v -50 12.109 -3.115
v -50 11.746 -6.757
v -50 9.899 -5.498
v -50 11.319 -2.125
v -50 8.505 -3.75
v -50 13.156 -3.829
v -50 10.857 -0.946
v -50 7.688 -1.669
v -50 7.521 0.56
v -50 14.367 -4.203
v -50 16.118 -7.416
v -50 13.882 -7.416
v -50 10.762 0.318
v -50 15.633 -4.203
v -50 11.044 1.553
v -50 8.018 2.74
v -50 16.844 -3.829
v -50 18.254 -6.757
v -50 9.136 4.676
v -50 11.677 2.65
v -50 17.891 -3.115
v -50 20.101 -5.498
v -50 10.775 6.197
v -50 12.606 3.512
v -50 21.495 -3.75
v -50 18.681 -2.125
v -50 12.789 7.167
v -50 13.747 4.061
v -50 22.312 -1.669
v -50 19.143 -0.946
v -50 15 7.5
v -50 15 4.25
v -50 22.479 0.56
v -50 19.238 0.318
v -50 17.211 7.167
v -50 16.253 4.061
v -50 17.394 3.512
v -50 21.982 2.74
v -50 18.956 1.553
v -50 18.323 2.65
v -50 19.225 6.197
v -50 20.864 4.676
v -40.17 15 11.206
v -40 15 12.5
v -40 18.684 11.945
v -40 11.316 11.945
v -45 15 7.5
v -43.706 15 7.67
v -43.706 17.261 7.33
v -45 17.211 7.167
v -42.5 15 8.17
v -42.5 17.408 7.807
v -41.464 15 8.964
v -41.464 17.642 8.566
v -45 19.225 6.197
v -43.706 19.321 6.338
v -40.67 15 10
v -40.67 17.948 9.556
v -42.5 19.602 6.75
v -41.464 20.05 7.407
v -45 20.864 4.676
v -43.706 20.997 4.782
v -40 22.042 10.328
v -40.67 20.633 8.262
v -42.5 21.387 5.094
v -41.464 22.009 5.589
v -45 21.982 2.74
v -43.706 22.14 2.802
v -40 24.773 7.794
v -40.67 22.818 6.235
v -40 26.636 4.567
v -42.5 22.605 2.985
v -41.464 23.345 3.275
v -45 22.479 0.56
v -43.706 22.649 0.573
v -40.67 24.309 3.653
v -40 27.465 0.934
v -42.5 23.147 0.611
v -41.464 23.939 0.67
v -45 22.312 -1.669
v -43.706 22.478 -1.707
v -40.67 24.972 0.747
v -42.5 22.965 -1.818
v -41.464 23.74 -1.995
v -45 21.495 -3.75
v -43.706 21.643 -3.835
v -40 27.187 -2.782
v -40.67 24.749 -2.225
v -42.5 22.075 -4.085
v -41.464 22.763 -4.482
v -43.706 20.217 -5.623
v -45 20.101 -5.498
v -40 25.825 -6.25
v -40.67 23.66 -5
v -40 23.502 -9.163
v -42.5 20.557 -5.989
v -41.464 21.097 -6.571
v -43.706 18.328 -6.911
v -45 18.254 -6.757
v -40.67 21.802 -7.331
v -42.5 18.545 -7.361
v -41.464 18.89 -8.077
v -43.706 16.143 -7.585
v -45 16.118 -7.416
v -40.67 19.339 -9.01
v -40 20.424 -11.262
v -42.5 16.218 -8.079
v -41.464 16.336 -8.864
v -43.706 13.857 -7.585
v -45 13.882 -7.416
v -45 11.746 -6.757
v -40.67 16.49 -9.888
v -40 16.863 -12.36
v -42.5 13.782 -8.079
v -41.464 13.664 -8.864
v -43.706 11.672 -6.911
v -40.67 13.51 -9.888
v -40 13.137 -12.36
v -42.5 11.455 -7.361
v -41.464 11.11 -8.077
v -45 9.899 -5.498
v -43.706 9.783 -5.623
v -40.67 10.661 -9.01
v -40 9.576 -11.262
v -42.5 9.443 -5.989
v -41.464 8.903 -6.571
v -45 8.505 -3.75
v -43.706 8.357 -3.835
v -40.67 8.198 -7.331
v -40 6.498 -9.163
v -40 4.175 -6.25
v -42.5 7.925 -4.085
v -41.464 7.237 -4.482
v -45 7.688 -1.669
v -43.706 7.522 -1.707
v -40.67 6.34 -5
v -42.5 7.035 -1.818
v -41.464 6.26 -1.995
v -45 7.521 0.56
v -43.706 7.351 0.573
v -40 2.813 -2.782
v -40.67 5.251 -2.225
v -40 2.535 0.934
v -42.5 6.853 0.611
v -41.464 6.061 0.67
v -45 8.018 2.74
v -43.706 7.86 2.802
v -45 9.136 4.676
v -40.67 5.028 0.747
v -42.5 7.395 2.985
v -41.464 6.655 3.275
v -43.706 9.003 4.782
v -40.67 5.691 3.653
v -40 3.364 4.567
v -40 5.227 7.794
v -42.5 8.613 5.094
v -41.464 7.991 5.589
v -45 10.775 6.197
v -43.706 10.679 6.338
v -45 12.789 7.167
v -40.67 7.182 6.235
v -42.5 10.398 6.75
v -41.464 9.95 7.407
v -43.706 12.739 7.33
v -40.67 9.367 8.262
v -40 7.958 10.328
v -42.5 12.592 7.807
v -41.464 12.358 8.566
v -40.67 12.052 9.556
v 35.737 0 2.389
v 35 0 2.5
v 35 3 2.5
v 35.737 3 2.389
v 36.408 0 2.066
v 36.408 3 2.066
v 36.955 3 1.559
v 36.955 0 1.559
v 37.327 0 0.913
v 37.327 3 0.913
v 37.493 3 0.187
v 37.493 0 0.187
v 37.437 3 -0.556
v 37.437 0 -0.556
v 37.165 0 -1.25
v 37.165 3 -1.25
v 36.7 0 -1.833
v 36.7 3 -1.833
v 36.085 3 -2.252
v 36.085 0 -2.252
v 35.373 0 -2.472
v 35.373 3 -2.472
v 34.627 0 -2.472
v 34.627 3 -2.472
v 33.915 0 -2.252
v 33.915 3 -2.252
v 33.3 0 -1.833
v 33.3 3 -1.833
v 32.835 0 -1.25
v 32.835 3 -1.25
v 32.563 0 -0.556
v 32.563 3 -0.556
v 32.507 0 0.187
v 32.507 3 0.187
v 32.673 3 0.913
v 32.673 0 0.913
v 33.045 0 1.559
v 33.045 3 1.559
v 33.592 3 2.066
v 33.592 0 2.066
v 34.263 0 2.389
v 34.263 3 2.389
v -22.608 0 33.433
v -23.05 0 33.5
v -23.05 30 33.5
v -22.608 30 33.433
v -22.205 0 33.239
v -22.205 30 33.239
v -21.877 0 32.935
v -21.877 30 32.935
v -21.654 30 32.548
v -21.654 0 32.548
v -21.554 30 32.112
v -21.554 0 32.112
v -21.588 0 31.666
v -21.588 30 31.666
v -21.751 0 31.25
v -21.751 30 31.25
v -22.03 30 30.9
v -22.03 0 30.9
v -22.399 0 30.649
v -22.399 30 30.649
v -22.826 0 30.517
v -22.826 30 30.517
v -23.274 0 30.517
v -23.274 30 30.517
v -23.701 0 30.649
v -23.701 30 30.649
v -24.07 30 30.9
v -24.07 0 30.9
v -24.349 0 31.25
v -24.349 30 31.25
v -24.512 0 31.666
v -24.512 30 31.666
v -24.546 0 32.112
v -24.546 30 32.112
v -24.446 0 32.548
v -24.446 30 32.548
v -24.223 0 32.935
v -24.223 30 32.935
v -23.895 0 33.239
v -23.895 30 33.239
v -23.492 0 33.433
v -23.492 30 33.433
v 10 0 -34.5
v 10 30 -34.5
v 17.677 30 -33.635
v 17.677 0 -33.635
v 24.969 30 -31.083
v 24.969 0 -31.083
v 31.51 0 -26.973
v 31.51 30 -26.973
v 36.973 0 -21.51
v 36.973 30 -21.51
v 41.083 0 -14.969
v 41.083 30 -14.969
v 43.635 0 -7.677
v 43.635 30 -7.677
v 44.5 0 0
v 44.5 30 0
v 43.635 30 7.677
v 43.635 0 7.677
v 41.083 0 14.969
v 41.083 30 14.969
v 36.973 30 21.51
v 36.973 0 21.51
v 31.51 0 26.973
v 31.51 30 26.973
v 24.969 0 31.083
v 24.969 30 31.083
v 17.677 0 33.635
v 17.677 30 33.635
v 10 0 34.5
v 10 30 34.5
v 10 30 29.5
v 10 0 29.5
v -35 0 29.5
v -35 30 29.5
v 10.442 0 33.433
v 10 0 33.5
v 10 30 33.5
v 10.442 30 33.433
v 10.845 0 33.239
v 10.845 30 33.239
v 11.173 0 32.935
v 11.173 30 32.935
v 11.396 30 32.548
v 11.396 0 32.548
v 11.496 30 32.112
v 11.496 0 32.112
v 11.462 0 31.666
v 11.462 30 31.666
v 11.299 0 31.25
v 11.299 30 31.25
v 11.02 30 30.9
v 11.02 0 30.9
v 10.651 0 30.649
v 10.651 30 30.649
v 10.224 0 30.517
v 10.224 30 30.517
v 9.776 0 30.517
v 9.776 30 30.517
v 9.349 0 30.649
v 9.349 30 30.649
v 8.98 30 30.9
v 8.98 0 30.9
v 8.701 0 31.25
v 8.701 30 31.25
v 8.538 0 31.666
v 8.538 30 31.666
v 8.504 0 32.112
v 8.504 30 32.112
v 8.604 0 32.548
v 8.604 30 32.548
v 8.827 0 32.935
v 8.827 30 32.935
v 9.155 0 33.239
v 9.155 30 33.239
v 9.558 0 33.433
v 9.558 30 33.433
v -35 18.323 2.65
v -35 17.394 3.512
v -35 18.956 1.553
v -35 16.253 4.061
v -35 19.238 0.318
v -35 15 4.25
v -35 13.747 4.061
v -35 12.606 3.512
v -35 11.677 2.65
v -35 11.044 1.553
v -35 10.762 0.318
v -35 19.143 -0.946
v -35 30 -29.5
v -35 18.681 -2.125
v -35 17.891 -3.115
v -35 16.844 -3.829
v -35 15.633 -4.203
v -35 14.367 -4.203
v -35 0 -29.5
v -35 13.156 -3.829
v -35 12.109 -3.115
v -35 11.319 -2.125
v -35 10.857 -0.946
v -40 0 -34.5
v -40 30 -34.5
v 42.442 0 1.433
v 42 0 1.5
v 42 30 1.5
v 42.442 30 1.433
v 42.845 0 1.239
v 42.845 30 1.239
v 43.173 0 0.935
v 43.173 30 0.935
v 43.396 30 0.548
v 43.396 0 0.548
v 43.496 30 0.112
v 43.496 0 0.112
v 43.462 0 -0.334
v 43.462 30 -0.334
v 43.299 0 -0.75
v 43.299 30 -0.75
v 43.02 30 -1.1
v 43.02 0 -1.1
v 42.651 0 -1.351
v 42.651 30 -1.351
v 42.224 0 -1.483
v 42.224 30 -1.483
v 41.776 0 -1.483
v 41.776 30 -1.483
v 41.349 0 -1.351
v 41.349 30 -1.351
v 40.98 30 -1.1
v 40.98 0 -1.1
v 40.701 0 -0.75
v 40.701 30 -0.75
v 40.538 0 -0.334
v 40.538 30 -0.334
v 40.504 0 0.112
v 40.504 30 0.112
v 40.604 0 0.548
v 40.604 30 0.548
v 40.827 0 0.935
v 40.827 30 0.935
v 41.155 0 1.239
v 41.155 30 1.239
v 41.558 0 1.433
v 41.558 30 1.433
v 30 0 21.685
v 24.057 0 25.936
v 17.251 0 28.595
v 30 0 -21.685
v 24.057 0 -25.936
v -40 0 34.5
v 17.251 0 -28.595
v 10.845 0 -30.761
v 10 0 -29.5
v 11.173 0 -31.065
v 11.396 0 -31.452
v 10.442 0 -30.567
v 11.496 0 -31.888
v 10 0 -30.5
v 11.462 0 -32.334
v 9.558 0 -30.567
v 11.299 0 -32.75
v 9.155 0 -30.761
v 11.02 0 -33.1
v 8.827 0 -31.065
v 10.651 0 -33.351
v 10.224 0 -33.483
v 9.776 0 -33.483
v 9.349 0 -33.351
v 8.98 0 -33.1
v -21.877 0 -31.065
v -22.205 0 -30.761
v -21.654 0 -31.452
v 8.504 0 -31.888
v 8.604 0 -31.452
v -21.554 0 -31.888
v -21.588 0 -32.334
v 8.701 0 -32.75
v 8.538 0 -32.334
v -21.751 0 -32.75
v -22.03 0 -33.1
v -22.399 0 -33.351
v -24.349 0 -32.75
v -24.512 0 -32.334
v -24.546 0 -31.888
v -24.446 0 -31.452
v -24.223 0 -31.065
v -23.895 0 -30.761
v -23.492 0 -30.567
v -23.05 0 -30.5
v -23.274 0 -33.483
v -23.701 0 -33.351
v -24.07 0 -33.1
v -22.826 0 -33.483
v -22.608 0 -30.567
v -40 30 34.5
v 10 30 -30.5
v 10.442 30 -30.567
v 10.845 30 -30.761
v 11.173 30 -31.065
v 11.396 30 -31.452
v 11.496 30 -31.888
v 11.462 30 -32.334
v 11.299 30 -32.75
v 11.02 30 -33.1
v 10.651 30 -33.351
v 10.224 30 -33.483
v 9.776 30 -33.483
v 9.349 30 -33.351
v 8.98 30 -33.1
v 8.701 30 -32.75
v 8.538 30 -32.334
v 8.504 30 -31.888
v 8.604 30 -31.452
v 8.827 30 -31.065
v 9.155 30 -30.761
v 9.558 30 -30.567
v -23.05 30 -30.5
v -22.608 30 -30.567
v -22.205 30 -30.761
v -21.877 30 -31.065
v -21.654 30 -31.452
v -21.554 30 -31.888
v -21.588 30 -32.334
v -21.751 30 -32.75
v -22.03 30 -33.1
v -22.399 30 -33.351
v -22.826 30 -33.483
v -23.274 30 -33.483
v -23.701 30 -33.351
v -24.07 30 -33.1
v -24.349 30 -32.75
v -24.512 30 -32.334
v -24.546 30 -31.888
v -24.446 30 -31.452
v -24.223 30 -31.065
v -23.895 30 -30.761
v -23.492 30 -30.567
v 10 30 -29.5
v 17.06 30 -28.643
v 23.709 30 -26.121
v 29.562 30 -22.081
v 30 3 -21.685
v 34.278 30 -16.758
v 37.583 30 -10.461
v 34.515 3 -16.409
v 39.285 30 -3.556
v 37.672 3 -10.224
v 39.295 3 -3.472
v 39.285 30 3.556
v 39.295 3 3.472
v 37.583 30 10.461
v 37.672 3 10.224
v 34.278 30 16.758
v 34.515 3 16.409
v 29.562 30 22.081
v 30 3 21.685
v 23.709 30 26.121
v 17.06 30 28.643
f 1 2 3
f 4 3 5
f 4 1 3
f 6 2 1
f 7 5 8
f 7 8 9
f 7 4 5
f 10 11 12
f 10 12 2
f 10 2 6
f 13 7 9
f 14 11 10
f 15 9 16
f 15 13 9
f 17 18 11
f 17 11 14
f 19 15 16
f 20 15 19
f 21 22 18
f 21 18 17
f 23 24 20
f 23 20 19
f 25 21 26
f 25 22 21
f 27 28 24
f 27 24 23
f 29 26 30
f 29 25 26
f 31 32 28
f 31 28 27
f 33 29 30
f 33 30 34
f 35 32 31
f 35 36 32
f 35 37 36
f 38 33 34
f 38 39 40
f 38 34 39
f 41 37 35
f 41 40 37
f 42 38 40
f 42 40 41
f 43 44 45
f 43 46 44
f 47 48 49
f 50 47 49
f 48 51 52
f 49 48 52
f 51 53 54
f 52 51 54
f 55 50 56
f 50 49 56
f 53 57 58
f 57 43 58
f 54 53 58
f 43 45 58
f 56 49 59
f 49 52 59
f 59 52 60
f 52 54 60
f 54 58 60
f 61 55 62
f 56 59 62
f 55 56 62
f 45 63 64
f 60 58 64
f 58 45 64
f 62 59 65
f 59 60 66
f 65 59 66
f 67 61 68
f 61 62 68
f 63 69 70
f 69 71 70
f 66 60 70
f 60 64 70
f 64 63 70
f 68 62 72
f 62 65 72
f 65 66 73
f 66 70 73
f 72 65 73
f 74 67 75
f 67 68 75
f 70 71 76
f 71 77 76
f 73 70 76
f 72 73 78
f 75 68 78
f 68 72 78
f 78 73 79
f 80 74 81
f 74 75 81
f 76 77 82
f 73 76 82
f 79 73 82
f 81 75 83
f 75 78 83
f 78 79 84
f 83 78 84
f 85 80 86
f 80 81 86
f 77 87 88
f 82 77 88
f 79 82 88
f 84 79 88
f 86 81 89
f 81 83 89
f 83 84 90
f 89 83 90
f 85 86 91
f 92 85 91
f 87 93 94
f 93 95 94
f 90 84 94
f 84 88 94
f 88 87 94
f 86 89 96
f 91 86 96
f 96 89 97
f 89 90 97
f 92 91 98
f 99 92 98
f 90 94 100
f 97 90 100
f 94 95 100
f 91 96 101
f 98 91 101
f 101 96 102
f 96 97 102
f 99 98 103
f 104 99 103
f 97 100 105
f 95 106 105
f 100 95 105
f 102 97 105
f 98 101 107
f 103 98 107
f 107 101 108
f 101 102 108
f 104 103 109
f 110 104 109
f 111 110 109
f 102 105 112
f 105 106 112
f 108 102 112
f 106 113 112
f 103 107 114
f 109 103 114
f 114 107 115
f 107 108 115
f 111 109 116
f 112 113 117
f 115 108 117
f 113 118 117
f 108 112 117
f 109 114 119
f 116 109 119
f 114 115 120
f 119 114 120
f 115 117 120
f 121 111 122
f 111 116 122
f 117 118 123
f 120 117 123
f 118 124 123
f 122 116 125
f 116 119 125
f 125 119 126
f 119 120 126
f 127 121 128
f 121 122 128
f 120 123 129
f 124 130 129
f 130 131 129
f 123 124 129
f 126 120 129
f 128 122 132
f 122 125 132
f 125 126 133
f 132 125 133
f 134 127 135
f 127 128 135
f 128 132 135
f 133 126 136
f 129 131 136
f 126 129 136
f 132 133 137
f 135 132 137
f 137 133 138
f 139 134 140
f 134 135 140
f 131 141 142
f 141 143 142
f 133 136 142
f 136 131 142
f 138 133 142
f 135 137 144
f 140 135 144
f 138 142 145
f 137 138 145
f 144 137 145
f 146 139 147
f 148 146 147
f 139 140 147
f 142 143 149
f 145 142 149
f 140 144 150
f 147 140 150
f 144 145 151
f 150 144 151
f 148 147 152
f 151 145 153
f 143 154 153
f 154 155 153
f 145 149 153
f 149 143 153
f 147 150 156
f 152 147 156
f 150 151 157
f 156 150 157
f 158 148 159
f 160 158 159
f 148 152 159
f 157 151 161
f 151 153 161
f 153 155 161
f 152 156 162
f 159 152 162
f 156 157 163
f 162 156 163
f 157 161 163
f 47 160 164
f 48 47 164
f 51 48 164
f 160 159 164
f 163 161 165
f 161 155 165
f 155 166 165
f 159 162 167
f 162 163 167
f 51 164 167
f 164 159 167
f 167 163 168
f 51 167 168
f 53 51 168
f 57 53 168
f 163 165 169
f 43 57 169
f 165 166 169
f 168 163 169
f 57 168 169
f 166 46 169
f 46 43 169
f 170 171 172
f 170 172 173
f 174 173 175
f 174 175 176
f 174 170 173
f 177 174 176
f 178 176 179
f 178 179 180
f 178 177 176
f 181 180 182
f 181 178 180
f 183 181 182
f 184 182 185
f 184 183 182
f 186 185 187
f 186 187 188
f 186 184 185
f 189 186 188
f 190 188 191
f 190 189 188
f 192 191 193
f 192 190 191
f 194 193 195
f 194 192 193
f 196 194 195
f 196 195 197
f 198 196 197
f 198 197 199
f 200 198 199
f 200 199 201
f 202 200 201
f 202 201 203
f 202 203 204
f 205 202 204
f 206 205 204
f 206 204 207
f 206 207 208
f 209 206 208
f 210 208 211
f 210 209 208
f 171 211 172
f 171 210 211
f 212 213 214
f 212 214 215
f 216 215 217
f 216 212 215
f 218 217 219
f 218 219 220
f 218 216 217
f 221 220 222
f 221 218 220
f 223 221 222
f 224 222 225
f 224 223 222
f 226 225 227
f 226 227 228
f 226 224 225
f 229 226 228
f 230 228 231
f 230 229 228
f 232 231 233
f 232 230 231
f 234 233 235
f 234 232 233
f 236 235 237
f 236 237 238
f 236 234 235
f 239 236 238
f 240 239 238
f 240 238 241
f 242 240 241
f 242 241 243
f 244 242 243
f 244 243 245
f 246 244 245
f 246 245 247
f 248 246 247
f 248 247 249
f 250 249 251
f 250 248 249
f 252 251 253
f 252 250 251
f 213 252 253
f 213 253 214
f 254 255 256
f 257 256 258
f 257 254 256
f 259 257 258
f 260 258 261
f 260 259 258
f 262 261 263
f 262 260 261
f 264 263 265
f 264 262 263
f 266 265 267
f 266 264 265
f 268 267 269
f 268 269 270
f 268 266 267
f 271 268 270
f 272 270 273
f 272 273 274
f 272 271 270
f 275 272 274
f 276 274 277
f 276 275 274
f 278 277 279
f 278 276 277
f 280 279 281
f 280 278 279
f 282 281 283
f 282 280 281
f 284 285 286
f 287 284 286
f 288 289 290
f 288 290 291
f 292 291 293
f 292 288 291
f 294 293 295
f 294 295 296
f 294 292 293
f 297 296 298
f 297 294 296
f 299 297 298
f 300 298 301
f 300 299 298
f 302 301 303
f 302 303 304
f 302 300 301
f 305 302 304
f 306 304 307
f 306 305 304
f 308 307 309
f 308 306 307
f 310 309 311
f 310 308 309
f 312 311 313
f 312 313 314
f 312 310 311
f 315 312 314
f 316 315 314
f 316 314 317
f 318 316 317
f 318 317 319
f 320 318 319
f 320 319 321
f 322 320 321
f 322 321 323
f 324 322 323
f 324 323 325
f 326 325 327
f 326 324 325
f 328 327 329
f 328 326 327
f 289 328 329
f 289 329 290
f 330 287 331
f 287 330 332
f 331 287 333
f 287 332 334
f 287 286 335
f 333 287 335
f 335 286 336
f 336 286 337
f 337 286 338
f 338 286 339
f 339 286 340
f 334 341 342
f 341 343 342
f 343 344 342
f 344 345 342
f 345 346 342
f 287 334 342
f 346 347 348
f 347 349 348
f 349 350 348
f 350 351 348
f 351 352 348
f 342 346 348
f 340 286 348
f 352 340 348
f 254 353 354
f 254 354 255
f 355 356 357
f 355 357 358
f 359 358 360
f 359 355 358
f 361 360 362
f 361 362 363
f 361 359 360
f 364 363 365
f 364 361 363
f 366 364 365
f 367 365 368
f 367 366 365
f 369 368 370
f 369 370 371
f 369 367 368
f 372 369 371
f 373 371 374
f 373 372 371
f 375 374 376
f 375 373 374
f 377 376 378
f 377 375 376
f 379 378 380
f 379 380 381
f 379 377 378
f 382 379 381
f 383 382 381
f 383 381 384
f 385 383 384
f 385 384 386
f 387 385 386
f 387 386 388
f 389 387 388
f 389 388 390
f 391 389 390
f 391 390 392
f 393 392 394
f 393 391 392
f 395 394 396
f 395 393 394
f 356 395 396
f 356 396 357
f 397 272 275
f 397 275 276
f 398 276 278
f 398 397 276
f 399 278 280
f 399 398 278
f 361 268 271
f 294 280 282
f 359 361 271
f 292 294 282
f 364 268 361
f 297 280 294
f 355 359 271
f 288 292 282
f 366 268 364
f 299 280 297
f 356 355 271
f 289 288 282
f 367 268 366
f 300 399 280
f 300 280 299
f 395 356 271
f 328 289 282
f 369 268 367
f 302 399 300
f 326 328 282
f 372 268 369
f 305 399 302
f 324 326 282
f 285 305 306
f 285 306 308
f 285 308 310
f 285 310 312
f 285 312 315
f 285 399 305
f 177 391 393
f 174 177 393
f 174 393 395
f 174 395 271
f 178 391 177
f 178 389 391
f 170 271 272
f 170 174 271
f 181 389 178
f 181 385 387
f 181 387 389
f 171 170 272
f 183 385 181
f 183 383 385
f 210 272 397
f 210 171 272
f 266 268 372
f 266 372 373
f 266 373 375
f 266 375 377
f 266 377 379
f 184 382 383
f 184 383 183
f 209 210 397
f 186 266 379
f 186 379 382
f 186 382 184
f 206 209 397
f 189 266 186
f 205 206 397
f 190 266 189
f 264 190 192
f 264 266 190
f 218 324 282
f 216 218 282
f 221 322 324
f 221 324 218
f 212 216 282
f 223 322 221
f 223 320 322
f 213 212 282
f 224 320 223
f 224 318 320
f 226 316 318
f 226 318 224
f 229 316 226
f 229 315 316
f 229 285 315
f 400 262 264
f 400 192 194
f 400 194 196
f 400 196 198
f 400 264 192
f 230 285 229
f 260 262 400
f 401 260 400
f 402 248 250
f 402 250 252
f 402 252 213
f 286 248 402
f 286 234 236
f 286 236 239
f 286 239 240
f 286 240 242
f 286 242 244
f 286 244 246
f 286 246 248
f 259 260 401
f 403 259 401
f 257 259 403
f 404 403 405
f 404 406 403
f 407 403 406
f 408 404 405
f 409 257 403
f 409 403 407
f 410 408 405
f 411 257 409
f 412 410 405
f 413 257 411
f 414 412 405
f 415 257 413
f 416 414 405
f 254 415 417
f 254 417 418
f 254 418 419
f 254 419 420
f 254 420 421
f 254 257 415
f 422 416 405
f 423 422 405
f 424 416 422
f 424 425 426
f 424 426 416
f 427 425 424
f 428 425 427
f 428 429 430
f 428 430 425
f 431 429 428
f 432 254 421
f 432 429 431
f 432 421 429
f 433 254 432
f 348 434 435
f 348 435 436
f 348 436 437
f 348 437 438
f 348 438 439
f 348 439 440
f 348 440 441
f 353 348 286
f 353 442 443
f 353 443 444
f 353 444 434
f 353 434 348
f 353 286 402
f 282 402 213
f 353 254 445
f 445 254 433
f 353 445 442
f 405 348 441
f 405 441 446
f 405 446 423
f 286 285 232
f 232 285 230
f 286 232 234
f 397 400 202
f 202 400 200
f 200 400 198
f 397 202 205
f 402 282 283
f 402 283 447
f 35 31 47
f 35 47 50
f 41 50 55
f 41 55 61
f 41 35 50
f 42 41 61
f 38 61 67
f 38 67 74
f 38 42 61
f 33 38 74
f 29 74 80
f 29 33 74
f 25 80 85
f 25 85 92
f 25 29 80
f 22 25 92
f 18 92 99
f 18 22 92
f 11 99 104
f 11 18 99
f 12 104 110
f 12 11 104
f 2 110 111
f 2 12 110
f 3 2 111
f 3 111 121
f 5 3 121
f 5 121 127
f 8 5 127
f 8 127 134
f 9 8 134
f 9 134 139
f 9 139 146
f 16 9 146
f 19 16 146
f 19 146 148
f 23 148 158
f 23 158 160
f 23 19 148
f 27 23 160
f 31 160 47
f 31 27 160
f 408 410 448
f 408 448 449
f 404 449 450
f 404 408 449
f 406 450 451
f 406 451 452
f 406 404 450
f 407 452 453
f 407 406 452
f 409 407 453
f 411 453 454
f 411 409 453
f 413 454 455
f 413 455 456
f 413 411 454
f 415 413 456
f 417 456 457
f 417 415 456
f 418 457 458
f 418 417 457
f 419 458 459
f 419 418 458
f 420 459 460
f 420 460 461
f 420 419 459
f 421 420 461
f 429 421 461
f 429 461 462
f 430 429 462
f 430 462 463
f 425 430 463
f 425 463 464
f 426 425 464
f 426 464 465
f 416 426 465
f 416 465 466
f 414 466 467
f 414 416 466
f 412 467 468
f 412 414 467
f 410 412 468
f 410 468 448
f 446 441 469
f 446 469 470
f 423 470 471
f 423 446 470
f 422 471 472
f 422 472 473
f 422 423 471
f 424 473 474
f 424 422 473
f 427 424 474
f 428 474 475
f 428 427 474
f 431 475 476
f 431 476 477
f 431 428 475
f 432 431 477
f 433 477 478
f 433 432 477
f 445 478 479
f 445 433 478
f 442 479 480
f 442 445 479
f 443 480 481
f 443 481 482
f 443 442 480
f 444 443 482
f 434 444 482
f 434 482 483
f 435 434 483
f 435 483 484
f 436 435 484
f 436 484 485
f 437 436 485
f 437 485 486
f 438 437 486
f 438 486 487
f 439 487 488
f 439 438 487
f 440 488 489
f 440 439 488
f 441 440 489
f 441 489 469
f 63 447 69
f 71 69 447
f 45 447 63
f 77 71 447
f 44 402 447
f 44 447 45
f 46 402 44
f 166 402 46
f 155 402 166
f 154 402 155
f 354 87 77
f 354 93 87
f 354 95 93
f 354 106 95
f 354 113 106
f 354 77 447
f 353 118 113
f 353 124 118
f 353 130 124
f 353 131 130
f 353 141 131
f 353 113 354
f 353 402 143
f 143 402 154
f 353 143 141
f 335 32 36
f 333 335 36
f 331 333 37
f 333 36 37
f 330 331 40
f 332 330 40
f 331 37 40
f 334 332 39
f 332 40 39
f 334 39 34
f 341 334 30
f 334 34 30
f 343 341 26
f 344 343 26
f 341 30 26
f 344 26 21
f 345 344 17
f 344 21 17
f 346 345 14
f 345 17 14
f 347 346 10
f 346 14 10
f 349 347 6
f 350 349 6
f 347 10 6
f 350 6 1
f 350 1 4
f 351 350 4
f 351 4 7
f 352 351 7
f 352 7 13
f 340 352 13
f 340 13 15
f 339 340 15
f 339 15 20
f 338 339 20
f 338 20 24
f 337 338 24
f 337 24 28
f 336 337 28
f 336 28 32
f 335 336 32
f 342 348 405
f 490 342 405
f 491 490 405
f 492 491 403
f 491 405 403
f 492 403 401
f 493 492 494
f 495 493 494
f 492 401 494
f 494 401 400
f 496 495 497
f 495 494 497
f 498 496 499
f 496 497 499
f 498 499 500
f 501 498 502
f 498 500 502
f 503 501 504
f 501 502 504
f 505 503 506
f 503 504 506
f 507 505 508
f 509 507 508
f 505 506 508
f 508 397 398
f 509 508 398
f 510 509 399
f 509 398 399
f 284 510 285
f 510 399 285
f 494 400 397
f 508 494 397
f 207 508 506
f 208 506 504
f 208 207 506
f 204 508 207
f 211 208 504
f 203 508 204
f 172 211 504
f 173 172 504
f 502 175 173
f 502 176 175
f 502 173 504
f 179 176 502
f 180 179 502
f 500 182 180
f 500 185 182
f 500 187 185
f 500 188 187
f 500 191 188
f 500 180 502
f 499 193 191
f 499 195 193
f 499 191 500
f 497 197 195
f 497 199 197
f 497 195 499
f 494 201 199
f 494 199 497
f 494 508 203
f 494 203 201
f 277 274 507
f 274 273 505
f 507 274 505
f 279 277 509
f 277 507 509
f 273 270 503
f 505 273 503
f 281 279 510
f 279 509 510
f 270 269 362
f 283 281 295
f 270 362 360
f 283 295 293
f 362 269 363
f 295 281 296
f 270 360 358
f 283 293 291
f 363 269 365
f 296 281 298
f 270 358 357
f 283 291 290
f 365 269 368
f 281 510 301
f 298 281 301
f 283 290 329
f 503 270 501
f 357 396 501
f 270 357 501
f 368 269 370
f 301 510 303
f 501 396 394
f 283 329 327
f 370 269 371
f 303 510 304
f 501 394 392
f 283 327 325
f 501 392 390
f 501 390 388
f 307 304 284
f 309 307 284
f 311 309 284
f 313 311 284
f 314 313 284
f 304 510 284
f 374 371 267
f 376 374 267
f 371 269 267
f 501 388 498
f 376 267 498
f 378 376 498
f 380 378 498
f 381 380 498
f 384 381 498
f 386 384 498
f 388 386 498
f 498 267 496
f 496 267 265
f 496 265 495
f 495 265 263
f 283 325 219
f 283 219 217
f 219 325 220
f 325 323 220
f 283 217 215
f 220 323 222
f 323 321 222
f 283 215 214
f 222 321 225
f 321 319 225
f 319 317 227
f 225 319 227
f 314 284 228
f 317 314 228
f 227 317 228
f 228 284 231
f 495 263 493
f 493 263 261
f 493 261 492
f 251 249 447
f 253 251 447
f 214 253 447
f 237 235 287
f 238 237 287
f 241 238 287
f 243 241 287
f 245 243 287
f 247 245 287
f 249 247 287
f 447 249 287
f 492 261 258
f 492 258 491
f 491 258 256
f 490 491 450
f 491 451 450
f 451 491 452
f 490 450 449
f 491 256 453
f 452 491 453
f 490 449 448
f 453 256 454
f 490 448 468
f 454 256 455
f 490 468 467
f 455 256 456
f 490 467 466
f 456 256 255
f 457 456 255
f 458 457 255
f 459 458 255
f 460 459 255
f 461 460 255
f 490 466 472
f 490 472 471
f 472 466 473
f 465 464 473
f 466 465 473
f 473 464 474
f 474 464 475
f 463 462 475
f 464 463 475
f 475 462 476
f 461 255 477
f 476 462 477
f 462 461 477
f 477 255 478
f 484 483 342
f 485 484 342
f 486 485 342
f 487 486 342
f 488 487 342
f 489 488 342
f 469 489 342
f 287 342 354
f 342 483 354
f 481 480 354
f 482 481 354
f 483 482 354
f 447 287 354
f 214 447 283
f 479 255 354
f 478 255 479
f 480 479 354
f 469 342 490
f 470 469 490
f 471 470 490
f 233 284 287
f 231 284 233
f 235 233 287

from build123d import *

# Parameters (mm, degrees)
SKETCH1_R           = 1.5
BOSS_EXTRUDE1_DEPTH = 30
SKETCH1_4_R         = 2.5
BOSS_EXTRUDE2_DEPTH = 3
SKETCH2_R           = 4.25
CUT_EXTRUDE1_DEPTH  = 3
BOSS_EXTRUDE3_START = 10
SKETCH3_R           = 7.5
SKETCH3_R_2         = 4.25
BOSS_EXTRUDE3_DEPTH = 10
FILLET1_R           = 5
SKETCH4_R           = 4.25
CUT_EXTRUDE2_DEPTH  = 10


with BuildPart() as part:
    # Sketch1 → Boss-Extrude1 (new body)
    with BuildSketch(Plane(origin=(0, 0, 0), x_dir=(1, 0, 0), z_dir=(0, 1, 0))):
        with BuildLine():
            Line((-40, -34.5), (10, -34.5))
            ThreePointArc((10, -34.5), (44.5, 0), (10, 34.5))
            Line((10, 34.5), (-40, 34.5))
            Line((-40, 34.5), (-40, -34.5))
        make_face()
        with Locations((-23.050007367, -32)):
            Circle(SKETCH1_R, mode=Mode.SUBTRACT)
        with Locations((10, -32)):
            Circle(SKETCH1_R, mode=Mode.SUBTRACT)
        with BuildLine():
            ThreePointArc((10, 29.5), (20.736274283, 27.476943326), (30, 21.685248442))
            ThreePointArc((30, 21.685248442), (39.5, 0), (30, -21.685248442))
            ThreePointArc((30, -21.685248442), (20.736274283, -27.476943326), (10, -29.5))
            Line((10, -29.5), (-35, -29.5))
            Line((-35, -29.5), (-35, 29.5))
            Line((-35, 29.5), (10, 29.5))
        make_face(mode=Mode.SUBTRACT)
        with Locations((-23.050007367, 32)):
            Circle(SKETCH1_R, mode=Mode.SUBTRACT)
        with Locations((42, 0)):
            Circle(SKETCH1_R, mode=Mode.SUBTRACT)
        with Locations((10, 32)):
            Circle(SKETCH1_R, mode=Mode.SUBTRACT)
    extrude(amount=BOSS_EXTRUDE1_DEPTH)

    # Sketch1<4> → Boss-Extrude2 (add)
    with BuildSketch(Plane(origin=(0, 0, 0), x_dir=(1, 0, 0), z_dir=(0, 1, 0))):
        with BuildLine():
            ThreePointArc((30, -21.685248442), (39.5, 0), (30, 21.685248442))
            Line((30, 21.685248442), (30, 18.020023033))
            Line((30, 18.020023033), (30, -9.598736105))
            Line((30, -9.598736105), (30, -21.685248442))
        make_face()
        with Locations((35, 0)):
            Circle(SKETCH1_4_R, mode=Mode.SUBTRACT)
    extrude(amount=BOSS_EXTRUDE2_DEPTH)

    # Sketch2 → Cut-Extrude1 (cut)
    with BuildSketch(Plane.ZY.offset(40)):
        with Locations((0, 15)):
            Circle(SKETCH2_R)
    extrude(amount=-CUT_EXTRUDE1_DEPTH, mode=Mode.SUBTRACT)

    # Sketch3 → Boss-Extrude3 (add)
    with BuildSketch(Plane.ZY.offset(40).offset(BOSS_EXTRUDE3_START)):
        with Locations((0, 15)):
            Circle(SKETCH3_R)
        with Locations((0, 15)):
            Circle(SKETCH3_R_2, mode=Mode.SUBTRACT)
    extrude(amount=-BOSS_EXTRUDE3_DEPTH)

    # Fillet1
    fillet1_edges = [part.edges().sort_by_distance(p)[0] for p in [
        (-40, 15, -7.5),
    ]]
    fillet(fillet1_edges, radius=FILLET1_R)

    # Sketch4 → Cut-Extrude2 (cut)
    with BuildSketch(Plane.ZY.offset(37)):
        with Locations((0, 15)):
            Circle(SKETCH4_R)
    extrude(amount=-CUT_EXTRUDE2_DEPTH, mode=Mode.SUBTRACT)


solid = part.part
